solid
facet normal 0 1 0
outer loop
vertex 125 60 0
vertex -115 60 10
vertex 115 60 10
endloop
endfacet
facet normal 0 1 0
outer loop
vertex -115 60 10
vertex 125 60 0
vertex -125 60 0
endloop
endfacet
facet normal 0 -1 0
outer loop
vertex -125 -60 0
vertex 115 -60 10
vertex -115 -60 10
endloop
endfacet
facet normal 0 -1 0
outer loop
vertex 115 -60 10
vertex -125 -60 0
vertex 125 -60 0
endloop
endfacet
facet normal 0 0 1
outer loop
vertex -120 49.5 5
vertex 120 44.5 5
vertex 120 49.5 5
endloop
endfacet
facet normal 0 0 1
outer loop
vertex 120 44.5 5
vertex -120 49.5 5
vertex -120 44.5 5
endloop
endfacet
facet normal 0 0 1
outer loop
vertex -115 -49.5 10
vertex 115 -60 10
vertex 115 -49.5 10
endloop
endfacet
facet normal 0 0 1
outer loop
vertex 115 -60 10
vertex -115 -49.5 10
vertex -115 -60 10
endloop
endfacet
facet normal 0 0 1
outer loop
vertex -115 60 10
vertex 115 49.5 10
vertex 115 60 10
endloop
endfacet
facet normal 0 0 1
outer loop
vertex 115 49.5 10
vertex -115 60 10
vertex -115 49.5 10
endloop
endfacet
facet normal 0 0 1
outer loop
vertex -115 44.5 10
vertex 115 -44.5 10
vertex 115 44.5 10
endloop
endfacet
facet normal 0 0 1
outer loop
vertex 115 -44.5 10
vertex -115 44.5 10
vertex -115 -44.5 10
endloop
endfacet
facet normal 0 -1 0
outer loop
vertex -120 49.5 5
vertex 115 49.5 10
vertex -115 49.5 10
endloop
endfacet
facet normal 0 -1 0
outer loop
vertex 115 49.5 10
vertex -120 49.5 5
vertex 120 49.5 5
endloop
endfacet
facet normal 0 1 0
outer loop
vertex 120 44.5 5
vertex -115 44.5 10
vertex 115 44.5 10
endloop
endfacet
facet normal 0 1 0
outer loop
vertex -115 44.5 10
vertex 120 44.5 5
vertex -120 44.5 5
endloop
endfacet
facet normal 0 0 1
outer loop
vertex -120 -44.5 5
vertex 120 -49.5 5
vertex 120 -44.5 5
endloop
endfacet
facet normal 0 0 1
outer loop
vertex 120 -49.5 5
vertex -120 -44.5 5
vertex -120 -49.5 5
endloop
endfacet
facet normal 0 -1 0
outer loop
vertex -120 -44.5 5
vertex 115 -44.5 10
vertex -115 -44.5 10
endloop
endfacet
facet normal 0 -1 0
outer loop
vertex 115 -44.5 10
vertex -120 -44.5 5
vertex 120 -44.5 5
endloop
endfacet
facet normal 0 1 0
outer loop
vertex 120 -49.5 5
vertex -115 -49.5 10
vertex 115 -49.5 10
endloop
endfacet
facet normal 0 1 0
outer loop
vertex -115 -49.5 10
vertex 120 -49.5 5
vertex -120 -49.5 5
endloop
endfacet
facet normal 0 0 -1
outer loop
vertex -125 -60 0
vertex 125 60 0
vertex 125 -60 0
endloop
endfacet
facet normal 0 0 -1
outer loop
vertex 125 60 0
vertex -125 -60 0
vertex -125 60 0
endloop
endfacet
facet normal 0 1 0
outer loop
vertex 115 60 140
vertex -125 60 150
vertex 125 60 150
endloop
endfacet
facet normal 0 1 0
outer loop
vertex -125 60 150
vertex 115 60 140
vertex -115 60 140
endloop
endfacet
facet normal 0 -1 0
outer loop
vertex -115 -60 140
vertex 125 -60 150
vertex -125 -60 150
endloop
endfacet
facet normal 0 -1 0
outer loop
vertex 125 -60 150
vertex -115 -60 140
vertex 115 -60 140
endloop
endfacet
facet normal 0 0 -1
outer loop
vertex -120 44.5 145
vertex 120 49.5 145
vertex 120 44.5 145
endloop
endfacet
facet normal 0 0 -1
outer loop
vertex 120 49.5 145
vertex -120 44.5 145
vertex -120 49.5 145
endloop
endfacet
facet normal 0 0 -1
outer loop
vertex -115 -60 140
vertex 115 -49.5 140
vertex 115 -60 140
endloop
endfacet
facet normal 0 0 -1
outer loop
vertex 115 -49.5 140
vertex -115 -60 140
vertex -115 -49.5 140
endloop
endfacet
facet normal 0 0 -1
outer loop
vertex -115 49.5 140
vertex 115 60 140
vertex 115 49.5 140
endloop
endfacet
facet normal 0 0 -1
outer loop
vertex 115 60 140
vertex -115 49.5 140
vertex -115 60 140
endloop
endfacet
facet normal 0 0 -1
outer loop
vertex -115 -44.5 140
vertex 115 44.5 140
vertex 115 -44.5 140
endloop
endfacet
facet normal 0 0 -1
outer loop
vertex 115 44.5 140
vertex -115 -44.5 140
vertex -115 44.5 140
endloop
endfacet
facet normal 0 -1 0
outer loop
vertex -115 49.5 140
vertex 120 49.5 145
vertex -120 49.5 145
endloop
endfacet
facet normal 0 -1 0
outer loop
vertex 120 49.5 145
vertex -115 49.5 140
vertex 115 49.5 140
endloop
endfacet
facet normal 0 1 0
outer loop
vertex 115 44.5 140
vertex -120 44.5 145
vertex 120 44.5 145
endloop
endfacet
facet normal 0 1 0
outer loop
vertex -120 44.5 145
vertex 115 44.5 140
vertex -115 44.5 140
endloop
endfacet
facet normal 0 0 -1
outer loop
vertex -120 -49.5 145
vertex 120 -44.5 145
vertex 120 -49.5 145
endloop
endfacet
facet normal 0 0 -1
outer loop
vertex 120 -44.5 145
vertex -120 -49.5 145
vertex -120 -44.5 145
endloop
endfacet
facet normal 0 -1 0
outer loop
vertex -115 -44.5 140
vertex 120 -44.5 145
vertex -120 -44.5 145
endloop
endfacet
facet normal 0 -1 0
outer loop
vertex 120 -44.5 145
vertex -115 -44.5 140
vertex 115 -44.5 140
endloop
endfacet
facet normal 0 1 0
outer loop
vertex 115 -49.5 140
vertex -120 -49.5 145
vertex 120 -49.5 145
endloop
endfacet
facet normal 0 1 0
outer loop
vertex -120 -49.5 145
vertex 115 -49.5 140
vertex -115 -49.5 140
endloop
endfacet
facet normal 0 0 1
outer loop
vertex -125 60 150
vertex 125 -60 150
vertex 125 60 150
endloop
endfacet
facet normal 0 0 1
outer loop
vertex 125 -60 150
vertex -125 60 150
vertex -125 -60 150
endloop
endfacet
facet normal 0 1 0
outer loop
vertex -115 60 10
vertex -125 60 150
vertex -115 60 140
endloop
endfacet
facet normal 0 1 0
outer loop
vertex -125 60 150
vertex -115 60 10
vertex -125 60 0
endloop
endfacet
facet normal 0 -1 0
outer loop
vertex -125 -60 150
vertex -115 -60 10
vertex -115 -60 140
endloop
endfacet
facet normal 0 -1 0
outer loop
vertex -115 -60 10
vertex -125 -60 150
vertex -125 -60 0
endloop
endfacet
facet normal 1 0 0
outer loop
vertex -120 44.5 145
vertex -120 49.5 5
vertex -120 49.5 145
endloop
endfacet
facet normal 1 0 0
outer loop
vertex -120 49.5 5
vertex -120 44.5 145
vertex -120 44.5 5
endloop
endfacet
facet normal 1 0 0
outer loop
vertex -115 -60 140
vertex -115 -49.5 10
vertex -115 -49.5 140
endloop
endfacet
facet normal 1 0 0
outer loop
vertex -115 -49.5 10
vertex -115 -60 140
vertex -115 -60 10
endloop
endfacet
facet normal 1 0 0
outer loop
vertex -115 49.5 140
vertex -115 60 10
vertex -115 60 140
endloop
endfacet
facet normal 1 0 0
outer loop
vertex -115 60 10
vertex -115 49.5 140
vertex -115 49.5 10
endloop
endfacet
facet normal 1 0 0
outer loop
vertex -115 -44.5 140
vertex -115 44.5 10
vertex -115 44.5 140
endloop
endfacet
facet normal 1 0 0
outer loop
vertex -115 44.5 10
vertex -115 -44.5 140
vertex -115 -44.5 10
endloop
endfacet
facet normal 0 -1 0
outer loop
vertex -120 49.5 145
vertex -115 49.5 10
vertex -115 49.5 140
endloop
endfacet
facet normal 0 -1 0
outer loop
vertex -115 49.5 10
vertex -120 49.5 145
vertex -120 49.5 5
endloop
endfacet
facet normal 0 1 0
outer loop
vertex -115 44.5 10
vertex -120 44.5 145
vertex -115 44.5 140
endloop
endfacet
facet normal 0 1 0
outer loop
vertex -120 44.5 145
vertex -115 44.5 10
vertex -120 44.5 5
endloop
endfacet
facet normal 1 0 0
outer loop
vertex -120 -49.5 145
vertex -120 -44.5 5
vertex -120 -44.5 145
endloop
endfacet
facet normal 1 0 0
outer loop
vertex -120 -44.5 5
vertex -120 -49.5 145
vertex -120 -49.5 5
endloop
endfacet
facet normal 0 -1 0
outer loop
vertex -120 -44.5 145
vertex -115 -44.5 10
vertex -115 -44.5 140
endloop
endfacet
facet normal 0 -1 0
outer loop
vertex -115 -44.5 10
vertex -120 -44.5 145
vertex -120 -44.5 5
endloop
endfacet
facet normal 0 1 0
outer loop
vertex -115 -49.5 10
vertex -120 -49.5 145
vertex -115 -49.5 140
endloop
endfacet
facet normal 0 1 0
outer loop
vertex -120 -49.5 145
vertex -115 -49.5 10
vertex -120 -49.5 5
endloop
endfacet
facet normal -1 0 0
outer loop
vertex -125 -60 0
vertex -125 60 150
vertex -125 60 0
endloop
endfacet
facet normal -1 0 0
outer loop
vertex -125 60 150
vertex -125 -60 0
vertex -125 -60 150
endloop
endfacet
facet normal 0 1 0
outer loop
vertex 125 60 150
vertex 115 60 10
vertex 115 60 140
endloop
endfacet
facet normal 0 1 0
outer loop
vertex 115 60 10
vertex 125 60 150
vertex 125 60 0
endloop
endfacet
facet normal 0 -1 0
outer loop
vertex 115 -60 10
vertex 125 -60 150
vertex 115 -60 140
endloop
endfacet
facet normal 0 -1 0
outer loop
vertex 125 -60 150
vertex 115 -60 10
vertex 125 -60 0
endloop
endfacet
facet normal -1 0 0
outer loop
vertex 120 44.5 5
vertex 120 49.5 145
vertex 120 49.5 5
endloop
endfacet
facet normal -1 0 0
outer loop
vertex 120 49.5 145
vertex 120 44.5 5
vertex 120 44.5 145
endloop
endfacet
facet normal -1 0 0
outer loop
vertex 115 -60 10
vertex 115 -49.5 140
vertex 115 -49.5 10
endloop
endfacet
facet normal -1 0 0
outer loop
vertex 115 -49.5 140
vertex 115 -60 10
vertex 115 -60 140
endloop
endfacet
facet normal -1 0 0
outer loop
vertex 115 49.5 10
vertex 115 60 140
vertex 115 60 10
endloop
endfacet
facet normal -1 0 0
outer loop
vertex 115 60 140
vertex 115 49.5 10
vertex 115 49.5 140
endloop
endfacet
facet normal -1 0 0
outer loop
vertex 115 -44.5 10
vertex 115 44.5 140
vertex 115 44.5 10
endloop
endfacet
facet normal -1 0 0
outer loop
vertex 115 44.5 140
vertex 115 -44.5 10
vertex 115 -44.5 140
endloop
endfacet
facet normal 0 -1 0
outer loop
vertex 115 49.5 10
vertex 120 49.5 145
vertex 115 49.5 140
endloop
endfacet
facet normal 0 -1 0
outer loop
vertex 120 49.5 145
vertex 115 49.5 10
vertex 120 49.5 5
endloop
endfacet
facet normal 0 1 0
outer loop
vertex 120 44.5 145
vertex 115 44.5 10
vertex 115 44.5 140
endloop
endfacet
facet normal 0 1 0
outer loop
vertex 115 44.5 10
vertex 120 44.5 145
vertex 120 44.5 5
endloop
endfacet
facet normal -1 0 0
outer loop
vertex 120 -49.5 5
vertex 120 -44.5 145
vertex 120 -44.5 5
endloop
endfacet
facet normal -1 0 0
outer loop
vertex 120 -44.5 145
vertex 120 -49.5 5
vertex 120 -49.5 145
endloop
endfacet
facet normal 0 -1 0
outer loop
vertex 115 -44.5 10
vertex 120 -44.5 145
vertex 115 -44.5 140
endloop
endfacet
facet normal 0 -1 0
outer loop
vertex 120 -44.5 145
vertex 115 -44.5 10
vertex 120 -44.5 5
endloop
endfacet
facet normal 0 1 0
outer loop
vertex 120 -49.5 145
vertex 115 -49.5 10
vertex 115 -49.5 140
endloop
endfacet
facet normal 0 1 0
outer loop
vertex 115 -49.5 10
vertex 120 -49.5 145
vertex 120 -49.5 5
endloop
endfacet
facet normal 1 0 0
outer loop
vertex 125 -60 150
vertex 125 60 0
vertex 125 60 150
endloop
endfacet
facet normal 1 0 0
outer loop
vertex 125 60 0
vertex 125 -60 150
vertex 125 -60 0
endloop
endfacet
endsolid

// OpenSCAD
//casing_full(caselenght,casedepth,caseheight,thickness,cutdepthtmp,cutheighthtmp)
casing_full(250,120,150,10,5,5);
//in mm

module casing_full(caselenght,casedepth,caseheight,thickness,cutdepthtmp,cutheighthtmp){
translate([0,0,thickness])
rotate([0,180,0])
casing(caselenght,casedepth,thickness,1,cutdepthtmp,cutheighthtmp); //Boden

translate([0,0,caseheight-thickness])
rotate([0,0,0])
casing(caselenght,casedepth,thickness,1,cutdepthtmp,cutheighthtmp); //Decke

translate([-caselenght/2+thickness,0,caseheight/2])
rotate([0,-90,0])
casing(caseheight,casedepth,thickness,1,cutdepthtmp,cutheighthtmp); //rechts

translate([caselenght/2-thickness,0,caseheight/2])
rotate([0,90,0])
casing(caseheight,casedepth,thickness,1,cutdepthtmp,cutheighthtmp); //rechts

echo("Interior Height ", caseheight-thickness*2, " Interior Lenght", caselenght-thickness*2, " Interior depht", casedepth-26);
echo("Exterior Height ", caseheight, " Exterior Lenght", caselenght, " Depth", casedepth);
echo("Frontplate Dimensions: Height ", caseheight-thickness*2+cutdepthtmp*2, " Lenght", caselenght-thickness*2+cutdepthtmp*2, " Thickness", cutheighthtmp);
echo("All dimensions are shown in mm");
}

module casing (lenght,depth,height,cut,cutdepth,cutheight){
	difference(){
		union(){
		translate([-lenght/2,-depth/2,0])
		cube([lenght,depth,height],center = false); //Basisplatte
		}
	union(){
		translate([lenght/2-height,-depth/2,0])
		rotate([0,45,0])
		translate([0,0,0])
		cube([height,depth,height*1.50],center = false); //Winkel Rechts

		mirror([1,0,0])
		translate([lenght/2-height,-depth/2,0])
		rotate([0,45,0])
		translate([0,0,0])
		cube([height,depth,height*1.50],center = false); //Winkel Links

		translate([0,depth/2-13,cutdepth/2])
		#cube([lenght*cut,cutheight*cut,cutdepth*cut],center = true);
		translate([0,-depth/2+13,cutdepth/2])
		#cube([lenght*cut,cutheight*cut,cutdepth*cut],center = true);
		}
	}
}
